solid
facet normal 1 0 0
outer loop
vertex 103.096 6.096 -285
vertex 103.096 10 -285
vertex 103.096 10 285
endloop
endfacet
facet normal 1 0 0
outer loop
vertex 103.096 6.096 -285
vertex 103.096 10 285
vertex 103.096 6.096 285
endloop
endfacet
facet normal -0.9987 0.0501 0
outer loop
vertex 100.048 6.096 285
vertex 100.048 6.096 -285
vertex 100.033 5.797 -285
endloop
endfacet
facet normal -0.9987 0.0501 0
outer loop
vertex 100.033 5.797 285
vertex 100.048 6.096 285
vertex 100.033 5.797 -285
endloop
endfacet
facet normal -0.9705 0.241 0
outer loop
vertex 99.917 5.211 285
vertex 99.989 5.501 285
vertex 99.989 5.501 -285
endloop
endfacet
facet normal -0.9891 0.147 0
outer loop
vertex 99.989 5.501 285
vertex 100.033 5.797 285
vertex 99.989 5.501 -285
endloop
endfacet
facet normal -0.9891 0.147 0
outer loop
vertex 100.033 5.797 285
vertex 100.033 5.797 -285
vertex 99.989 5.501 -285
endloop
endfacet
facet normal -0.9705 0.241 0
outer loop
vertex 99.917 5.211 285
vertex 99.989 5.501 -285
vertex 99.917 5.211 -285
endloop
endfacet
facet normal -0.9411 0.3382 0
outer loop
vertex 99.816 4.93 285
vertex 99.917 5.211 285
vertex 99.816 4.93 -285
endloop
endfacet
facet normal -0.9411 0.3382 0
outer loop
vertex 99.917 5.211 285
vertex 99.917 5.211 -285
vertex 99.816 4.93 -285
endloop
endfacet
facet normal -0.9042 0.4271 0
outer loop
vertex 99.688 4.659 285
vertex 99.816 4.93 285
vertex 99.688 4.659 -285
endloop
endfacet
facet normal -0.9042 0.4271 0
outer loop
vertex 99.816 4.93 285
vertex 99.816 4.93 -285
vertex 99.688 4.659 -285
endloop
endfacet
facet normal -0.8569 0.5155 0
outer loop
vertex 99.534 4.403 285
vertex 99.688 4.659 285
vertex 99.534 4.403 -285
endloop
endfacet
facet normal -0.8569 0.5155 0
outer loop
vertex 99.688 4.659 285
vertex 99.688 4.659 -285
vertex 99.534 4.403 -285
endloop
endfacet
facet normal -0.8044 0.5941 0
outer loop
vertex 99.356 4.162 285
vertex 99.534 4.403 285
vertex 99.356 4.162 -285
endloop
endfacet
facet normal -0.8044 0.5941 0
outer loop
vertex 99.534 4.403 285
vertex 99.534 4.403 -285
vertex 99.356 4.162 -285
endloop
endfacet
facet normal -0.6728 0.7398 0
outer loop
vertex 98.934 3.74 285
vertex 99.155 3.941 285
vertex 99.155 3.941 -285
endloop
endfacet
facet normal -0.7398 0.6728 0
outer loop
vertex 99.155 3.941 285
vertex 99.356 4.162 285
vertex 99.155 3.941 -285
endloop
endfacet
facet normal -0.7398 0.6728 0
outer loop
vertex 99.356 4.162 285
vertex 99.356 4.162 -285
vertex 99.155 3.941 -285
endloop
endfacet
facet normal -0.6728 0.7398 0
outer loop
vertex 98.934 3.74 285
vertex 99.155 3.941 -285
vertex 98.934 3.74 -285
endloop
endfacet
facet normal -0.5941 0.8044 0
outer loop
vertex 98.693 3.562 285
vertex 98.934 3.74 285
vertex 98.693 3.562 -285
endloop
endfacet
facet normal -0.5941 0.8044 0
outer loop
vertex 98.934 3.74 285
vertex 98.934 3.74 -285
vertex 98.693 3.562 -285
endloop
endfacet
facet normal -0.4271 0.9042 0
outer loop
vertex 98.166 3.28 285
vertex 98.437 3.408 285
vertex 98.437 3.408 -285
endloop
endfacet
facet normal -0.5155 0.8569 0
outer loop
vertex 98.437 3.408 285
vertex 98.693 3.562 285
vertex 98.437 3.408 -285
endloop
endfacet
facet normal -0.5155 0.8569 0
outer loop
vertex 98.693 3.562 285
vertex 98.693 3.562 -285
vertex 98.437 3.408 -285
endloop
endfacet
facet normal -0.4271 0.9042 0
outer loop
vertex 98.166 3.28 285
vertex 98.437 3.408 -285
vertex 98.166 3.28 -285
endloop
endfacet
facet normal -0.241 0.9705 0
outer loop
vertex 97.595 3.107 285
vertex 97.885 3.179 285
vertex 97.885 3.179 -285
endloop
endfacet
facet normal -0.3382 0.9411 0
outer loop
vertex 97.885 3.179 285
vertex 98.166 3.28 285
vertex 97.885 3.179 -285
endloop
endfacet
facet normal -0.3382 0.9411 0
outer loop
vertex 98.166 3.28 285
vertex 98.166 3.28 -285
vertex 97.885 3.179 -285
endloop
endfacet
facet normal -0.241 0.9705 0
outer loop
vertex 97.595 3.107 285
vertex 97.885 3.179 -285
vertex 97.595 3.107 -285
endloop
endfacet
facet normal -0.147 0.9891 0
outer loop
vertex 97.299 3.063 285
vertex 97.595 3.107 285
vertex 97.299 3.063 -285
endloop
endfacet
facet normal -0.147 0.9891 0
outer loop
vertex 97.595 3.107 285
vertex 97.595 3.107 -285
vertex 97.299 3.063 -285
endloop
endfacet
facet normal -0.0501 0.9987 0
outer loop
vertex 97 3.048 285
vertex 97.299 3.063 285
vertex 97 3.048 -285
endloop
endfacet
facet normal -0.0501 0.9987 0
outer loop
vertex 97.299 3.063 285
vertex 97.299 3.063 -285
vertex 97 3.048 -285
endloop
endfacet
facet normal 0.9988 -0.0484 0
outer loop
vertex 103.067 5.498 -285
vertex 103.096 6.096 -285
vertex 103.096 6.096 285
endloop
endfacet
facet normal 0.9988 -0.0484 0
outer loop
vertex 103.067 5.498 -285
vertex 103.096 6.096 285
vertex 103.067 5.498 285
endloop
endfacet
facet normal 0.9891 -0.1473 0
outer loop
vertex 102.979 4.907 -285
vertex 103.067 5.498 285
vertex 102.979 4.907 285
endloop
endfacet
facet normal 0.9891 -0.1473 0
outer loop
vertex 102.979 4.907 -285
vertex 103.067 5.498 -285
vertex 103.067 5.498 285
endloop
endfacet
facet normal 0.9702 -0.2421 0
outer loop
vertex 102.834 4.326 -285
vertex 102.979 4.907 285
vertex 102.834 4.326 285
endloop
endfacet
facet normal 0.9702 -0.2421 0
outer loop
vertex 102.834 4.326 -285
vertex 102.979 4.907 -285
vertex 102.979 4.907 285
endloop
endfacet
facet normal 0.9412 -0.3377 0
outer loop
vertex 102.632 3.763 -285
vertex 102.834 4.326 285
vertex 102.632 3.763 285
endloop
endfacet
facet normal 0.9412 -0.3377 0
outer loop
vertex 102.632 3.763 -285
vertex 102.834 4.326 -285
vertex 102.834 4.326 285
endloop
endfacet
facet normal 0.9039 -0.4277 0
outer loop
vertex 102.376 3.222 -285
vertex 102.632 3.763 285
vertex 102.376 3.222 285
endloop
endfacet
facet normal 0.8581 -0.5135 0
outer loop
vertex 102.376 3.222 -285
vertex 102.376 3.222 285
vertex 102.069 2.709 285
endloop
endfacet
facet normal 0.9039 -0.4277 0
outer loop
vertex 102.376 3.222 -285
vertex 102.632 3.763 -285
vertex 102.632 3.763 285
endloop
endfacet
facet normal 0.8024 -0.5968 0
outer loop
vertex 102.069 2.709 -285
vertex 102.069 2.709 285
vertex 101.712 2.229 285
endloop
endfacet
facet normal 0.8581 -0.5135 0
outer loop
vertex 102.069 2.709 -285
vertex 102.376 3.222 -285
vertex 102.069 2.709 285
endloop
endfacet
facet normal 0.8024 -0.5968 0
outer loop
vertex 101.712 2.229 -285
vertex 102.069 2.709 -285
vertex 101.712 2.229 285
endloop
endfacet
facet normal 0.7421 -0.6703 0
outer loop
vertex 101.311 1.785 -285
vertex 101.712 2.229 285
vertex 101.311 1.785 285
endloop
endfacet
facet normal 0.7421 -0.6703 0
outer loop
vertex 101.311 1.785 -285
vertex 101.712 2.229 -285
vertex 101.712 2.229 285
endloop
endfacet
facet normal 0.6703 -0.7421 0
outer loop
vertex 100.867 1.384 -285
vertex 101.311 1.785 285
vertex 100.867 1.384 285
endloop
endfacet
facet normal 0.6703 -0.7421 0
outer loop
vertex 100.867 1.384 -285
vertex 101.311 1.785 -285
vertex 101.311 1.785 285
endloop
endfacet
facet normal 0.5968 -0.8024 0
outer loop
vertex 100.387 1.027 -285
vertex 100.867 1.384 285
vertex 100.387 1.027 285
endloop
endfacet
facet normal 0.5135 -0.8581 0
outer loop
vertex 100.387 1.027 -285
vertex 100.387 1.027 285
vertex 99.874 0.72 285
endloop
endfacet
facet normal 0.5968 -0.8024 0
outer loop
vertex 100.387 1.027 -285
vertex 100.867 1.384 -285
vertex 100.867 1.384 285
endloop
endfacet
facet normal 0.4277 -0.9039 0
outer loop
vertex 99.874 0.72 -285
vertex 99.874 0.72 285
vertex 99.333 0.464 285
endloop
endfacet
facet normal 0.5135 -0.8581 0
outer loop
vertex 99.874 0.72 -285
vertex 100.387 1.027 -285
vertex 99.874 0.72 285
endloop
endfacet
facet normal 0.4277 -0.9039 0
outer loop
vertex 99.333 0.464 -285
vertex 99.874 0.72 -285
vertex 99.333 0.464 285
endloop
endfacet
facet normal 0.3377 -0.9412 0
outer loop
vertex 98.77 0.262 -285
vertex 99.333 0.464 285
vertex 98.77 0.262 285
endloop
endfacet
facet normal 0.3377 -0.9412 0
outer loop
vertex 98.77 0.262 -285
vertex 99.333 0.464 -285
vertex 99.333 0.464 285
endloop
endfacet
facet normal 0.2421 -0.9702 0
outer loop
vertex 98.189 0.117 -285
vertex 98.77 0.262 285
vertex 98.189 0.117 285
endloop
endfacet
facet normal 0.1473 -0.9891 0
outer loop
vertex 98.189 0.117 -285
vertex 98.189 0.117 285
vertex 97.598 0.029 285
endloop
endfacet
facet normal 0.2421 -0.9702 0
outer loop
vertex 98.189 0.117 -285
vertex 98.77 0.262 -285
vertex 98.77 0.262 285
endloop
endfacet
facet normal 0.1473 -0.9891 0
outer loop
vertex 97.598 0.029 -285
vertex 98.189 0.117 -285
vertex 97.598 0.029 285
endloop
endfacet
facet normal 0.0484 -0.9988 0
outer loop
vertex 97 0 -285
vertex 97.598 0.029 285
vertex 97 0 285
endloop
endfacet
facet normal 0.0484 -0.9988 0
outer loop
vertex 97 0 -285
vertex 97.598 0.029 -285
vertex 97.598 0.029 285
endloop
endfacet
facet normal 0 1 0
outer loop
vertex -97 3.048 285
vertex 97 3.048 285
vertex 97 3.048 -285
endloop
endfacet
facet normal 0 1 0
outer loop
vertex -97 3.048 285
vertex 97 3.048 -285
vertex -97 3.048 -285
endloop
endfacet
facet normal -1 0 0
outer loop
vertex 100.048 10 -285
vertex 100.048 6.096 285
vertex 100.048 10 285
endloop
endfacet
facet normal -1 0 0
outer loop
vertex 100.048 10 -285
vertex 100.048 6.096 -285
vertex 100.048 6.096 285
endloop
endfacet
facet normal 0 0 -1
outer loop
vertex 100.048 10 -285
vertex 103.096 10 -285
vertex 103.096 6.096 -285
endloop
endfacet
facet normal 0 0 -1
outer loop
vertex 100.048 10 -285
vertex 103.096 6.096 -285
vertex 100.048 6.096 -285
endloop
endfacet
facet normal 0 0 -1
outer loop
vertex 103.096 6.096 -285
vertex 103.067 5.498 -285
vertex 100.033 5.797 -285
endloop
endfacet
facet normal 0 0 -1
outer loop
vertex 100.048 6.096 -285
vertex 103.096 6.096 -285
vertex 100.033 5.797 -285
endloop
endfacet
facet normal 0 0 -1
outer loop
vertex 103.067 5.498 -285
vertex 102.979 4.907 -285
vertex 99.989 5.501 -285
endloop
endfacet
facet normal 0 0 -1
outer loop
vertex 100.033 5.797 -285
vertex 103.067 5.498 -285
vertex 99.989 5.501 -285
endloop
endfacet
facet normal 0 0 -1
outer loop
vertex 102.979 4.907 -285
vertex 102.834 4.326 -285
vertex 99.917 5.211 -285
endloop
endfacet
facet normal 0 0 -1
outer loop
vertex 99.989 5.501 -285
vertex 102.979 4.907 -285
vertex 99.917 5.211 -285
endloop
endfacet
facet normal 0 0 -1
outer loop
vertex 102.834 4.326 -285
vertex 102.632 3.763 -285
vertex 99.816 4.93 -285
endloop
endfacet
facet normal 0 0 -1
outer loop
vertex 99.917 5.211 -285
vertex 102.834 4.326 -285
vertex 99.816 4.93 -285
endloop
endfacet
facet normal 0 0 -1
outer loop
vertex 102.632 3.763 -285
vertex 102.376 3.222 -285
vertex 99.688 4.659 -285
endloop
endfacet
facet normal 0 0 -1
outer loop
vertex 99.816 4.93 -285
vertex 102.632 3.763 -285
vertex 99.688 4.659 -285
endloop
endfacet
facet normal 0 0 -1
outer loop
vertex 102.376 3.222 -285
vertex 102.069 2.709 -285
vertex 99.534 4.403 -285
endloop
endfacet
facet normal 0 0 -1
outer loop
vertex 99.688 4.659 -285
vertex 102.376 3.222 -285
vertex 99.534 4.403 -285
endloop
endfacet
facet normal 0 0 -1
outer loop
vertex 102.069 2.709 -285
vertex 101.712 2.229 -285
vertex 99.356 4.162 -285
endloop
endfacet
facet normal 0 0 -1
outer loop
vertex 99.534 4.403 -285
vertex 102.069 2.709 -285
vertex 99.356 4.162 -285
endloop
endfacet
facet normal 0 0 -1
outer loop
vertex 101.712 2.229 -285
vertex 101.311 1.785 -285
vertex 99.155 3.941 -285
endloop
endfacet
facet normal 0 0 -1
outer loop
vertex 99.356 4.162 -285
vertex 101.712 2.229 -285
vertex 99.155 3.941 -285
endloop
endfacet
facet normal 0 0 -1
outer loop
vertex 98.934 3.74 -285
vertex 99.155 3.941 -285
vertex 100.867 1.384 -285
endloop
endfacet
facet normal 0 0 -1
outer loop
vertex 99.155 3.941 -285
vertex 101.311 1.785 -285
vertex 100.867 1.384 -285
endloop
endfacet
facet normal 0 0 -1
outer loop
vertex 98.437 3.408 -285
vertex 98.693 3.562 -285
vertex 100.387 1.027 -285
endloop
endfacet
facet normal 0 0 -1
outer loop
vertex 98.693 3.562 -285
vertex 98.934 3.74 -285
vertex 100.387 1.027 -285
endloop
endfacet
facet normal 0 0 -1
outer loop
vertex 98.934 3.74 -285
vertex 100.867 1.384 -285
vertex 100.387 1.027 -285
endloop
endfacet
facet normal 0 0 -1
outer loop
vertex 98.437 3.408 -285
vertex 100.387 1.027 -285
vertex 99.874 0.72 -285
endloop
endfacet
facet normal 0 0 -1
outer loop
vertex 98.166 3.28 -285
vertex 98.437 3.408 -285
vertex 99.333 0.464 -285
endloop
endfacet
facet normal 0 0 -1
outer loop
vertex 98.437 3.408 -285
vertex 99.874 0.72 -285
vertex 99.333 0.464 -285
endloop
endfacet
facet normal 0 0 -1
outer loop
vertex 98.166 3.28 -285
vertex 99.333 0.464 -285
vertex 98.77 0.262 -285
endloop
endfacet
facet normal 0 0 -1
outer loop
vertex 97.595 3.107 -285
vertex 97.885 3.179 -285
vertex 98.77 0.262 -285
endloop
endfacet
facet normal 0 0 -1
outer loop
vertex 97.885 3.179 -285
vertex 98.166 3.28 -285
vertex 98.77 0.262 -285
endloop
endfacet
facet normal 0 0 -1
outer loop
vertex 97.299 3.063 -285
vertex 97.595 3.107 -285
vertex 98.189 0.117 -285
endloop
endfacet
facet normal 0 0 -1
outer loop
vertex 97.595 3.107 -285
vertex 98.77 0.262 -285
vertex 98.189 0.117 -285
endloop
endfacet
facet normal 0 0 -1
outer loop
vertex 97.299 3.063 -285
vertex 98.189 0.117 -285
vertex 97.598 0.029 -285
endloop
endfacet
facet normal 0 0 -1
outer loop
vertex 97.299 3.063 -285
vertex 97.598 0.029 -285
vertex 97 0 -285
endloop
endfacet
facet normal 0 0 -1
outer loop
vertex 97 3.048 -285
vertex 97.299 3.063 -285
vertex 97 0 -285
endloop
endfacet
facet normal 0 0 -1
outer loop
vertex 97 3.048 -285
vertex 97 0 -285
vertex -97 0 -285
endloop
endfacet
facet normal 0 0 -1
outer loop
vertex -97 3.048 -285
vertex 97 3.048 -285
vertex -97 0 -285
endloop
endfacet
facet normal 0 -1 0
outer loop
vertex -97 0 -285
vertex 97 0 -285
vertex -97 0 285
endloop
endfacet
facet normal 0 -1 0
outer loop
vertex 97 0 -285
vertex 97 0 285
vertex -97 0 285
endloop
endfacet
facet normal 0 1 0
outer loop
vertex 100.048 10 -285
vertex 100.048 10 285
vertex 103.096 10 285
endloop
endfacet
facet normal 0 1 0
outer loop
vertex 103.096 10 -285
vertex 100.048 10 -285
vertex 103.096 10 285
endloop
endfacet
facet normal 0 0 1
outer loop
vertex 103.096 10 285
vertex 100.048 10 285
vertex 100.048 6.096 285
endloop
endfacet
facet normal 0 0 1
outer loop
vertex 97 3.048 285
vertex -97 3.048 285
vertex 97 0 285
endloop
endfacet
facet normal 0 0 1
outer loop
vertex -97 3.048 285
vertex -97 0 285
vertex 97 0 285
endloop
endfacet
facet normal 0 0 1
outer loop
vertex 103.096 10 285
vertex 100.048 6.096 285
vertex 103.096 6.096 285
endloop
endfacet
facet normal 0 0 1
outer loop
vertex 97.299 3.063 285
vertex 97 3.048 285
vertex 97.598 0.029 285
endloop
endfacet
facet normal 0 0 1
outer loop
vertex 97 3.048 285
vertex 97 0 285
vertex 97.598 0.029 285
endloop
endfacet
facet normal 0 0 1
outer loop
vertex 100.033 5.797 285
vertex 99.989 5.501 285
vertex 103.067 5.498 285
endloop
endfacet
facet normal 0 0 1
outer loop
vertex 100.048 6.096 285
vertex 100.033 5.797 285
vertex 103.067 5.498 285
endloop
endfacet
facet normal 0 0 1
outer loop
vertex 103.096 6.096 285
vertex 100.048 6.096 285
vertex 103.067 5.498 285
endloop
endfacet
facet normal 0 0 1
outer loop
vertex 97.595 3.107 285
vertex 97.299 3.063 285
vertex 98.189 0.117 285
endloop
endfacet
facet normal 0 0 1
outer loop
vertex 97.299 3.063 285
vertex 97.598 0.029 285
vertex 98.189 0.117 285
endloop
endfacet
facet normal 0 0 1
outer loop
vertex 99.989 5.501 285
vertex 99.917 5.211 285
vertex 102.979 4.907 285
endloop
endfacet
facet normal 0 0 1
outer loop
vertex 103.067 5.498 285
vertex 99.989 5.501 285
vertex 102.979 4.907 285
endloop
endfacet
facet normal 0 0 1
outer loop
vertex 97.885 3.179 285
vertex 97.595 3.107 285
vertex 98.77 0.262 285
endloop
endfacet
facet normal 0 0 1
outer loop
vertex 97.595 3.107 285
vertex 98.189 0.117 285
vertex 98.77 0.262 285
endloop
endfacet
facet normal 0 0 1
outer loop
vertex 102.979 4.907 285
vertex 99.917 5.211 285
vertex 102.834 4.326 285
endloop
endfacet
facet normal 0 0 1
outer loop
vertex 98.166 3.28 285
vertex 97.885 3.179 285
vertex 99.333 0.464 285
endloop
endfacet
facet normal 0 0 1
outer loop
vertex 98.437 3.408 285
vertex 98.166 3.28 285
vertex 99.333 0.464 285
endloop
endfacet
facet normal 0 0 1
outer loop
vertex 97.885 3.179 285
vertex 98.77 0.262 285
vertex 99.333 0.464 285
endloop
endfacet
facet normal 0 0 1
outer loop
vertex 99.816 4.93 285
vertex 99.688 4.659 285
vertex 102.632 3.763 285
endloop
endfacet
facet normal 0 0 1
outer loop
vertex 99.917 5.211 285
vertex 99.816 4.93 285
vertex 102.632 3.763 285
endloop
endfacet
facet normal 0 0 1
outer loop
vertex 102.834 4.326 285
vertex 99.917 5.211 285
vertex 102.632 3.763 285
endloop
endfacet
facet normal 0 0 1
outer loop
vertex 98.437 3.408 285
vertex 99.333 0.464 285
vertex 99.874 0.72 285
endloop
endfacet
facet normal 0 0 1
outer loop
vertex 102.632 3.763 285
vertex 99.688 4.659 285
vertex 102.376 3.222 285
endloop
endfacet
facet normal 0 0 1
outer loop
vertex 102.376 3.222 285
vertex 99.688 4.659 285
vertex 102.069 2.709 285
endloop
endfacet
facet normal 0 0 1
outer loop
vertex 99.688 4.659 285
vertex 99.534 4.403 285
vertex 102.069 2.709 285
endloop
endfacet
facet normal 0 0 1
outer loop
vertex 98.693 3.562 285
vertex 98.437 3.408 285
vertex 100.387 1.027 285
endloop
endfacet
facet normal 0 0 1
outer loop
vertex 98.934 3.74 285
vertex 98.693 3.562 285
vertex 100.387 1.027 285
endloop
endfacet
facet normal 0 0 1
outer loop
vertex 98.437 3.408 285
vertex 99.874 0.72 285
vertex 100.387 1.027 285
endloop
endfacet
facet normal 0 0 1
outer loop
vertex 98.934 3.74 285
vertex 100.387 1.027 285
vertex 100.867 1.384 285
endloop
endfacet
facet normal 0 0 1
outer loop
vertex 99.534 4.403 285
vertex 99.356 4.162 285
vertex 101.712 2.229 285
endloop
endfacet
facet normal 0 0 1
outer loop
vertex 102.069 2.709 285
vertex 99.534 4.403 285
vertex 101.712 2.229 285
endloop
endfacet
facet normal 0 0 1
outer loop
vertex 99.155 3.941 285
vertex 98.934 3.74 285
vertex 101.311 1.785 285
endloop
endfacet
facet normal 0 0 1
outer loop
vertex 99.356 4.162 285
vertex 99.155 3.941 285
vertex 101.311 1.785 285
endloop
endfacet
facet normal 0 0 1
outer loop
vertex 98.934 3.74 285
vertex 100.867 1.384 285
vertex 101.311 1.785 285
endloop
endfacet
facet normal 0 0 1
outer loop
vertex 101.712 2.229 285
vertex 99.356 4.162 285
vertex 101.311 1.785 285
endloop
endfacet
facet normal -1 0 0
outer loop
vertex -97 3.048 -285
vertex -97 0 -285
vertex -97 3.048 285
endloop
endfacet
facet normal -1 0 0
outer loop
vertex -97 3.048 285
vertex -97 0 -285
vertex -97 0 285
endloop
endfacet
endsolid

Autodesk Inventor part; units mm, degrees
ref_plane "YZ Plane" through (0, 0, 0) normal (1, 0, 0) x (0, 1, 0)
ref_plane "XZ Plane" through (0, 0, 0) normal (0, 1, 0) x (-1, 0, 0)
ref_plane "XY Plane" through (0, 0, 0) normal (0, 0, 1) x (1, 0, 0)
sketch "Sketch1" plane through (0, 0, 0) normal (0, 1, 0) x (-1, 0, 0)
  line L0 (97, 285) -> (-97, 285)
  line L1 (-97, 285) -> (-97, -285)
  line L2 (-97, -285) -> (97, -285)
  line L3 (97, -285) -> (97, 285)
  point P0 (0, 0)
  dimension "d0" = 194
  dimension "d1" = 570
  dimension "d2" = 97
  dimension "d3" = 285
extrude "Plate1" add sketch "Sketch1" along normal blind 3.048
sketch "Sketch3" plane through (100.048, 6.096, -285) normal (1, 0, 0) x (0, 1, 0)
  line L0 (0, 570) -> (0, 0)
  line L1 (0, 0) -> (3.904, 0)
  line L2 (3.904, 0) -> (3.904, 570)
  line L3 (3.904, 570) -> (0, 570)
edge flange "Flange1" height 10 angle 90 thickness 3.048 bend radius 3.048 thickness toward (1, 0, 0) relief tear relief width 3.048 relief depth 1.524 edges at (97, 3.048, 0) wall of the first edge with corners at (100.048, 6.096, 285) (100.048, 6.096, -285) (100.048, 10, -285) (100.048, 10, 285)
bend "Bend1"
corner "Corner1"
equation "\"d4\" = Thickness"
equation "\"d5\" = BendReliefWidth"
equation "\"d6\" = BendReliefDepth"
equation "\"d7\" = MinimumRemnant"
equation "\"d8\" = TransitionRadius"
equation "\"d11\" = BendRadius"
equation "\"d12\" = CornerReliefSize"
equation "\"d13\" = GapSize"
equation "\"d14\" = JacobiRadiusSize"
equation "\"d2\" = 0.5 * d0"
equation "\"d3\" = 0.5 * d1"
equation "\"BendRadius\" = Thickness"
equation "\"BendReliefWidth\" = Thickness"
equation "\"BendReliefDepth\" = 0.5 * Thickness"
equation "\"CornerReliefSize\" = 4 * Thickness"
equation "\"MinimumRemnant\" = 2 * Thickness"
equation "\"TransitionRadius\" = BendRadius"
equation "\"JacobiRadiusSize\" = BendRadius"
equation "\"GapSize\" = Thickness"
equation "\"Thickness\" = 3.048"
properties part number "CO-1-01-controlsSeperator"
